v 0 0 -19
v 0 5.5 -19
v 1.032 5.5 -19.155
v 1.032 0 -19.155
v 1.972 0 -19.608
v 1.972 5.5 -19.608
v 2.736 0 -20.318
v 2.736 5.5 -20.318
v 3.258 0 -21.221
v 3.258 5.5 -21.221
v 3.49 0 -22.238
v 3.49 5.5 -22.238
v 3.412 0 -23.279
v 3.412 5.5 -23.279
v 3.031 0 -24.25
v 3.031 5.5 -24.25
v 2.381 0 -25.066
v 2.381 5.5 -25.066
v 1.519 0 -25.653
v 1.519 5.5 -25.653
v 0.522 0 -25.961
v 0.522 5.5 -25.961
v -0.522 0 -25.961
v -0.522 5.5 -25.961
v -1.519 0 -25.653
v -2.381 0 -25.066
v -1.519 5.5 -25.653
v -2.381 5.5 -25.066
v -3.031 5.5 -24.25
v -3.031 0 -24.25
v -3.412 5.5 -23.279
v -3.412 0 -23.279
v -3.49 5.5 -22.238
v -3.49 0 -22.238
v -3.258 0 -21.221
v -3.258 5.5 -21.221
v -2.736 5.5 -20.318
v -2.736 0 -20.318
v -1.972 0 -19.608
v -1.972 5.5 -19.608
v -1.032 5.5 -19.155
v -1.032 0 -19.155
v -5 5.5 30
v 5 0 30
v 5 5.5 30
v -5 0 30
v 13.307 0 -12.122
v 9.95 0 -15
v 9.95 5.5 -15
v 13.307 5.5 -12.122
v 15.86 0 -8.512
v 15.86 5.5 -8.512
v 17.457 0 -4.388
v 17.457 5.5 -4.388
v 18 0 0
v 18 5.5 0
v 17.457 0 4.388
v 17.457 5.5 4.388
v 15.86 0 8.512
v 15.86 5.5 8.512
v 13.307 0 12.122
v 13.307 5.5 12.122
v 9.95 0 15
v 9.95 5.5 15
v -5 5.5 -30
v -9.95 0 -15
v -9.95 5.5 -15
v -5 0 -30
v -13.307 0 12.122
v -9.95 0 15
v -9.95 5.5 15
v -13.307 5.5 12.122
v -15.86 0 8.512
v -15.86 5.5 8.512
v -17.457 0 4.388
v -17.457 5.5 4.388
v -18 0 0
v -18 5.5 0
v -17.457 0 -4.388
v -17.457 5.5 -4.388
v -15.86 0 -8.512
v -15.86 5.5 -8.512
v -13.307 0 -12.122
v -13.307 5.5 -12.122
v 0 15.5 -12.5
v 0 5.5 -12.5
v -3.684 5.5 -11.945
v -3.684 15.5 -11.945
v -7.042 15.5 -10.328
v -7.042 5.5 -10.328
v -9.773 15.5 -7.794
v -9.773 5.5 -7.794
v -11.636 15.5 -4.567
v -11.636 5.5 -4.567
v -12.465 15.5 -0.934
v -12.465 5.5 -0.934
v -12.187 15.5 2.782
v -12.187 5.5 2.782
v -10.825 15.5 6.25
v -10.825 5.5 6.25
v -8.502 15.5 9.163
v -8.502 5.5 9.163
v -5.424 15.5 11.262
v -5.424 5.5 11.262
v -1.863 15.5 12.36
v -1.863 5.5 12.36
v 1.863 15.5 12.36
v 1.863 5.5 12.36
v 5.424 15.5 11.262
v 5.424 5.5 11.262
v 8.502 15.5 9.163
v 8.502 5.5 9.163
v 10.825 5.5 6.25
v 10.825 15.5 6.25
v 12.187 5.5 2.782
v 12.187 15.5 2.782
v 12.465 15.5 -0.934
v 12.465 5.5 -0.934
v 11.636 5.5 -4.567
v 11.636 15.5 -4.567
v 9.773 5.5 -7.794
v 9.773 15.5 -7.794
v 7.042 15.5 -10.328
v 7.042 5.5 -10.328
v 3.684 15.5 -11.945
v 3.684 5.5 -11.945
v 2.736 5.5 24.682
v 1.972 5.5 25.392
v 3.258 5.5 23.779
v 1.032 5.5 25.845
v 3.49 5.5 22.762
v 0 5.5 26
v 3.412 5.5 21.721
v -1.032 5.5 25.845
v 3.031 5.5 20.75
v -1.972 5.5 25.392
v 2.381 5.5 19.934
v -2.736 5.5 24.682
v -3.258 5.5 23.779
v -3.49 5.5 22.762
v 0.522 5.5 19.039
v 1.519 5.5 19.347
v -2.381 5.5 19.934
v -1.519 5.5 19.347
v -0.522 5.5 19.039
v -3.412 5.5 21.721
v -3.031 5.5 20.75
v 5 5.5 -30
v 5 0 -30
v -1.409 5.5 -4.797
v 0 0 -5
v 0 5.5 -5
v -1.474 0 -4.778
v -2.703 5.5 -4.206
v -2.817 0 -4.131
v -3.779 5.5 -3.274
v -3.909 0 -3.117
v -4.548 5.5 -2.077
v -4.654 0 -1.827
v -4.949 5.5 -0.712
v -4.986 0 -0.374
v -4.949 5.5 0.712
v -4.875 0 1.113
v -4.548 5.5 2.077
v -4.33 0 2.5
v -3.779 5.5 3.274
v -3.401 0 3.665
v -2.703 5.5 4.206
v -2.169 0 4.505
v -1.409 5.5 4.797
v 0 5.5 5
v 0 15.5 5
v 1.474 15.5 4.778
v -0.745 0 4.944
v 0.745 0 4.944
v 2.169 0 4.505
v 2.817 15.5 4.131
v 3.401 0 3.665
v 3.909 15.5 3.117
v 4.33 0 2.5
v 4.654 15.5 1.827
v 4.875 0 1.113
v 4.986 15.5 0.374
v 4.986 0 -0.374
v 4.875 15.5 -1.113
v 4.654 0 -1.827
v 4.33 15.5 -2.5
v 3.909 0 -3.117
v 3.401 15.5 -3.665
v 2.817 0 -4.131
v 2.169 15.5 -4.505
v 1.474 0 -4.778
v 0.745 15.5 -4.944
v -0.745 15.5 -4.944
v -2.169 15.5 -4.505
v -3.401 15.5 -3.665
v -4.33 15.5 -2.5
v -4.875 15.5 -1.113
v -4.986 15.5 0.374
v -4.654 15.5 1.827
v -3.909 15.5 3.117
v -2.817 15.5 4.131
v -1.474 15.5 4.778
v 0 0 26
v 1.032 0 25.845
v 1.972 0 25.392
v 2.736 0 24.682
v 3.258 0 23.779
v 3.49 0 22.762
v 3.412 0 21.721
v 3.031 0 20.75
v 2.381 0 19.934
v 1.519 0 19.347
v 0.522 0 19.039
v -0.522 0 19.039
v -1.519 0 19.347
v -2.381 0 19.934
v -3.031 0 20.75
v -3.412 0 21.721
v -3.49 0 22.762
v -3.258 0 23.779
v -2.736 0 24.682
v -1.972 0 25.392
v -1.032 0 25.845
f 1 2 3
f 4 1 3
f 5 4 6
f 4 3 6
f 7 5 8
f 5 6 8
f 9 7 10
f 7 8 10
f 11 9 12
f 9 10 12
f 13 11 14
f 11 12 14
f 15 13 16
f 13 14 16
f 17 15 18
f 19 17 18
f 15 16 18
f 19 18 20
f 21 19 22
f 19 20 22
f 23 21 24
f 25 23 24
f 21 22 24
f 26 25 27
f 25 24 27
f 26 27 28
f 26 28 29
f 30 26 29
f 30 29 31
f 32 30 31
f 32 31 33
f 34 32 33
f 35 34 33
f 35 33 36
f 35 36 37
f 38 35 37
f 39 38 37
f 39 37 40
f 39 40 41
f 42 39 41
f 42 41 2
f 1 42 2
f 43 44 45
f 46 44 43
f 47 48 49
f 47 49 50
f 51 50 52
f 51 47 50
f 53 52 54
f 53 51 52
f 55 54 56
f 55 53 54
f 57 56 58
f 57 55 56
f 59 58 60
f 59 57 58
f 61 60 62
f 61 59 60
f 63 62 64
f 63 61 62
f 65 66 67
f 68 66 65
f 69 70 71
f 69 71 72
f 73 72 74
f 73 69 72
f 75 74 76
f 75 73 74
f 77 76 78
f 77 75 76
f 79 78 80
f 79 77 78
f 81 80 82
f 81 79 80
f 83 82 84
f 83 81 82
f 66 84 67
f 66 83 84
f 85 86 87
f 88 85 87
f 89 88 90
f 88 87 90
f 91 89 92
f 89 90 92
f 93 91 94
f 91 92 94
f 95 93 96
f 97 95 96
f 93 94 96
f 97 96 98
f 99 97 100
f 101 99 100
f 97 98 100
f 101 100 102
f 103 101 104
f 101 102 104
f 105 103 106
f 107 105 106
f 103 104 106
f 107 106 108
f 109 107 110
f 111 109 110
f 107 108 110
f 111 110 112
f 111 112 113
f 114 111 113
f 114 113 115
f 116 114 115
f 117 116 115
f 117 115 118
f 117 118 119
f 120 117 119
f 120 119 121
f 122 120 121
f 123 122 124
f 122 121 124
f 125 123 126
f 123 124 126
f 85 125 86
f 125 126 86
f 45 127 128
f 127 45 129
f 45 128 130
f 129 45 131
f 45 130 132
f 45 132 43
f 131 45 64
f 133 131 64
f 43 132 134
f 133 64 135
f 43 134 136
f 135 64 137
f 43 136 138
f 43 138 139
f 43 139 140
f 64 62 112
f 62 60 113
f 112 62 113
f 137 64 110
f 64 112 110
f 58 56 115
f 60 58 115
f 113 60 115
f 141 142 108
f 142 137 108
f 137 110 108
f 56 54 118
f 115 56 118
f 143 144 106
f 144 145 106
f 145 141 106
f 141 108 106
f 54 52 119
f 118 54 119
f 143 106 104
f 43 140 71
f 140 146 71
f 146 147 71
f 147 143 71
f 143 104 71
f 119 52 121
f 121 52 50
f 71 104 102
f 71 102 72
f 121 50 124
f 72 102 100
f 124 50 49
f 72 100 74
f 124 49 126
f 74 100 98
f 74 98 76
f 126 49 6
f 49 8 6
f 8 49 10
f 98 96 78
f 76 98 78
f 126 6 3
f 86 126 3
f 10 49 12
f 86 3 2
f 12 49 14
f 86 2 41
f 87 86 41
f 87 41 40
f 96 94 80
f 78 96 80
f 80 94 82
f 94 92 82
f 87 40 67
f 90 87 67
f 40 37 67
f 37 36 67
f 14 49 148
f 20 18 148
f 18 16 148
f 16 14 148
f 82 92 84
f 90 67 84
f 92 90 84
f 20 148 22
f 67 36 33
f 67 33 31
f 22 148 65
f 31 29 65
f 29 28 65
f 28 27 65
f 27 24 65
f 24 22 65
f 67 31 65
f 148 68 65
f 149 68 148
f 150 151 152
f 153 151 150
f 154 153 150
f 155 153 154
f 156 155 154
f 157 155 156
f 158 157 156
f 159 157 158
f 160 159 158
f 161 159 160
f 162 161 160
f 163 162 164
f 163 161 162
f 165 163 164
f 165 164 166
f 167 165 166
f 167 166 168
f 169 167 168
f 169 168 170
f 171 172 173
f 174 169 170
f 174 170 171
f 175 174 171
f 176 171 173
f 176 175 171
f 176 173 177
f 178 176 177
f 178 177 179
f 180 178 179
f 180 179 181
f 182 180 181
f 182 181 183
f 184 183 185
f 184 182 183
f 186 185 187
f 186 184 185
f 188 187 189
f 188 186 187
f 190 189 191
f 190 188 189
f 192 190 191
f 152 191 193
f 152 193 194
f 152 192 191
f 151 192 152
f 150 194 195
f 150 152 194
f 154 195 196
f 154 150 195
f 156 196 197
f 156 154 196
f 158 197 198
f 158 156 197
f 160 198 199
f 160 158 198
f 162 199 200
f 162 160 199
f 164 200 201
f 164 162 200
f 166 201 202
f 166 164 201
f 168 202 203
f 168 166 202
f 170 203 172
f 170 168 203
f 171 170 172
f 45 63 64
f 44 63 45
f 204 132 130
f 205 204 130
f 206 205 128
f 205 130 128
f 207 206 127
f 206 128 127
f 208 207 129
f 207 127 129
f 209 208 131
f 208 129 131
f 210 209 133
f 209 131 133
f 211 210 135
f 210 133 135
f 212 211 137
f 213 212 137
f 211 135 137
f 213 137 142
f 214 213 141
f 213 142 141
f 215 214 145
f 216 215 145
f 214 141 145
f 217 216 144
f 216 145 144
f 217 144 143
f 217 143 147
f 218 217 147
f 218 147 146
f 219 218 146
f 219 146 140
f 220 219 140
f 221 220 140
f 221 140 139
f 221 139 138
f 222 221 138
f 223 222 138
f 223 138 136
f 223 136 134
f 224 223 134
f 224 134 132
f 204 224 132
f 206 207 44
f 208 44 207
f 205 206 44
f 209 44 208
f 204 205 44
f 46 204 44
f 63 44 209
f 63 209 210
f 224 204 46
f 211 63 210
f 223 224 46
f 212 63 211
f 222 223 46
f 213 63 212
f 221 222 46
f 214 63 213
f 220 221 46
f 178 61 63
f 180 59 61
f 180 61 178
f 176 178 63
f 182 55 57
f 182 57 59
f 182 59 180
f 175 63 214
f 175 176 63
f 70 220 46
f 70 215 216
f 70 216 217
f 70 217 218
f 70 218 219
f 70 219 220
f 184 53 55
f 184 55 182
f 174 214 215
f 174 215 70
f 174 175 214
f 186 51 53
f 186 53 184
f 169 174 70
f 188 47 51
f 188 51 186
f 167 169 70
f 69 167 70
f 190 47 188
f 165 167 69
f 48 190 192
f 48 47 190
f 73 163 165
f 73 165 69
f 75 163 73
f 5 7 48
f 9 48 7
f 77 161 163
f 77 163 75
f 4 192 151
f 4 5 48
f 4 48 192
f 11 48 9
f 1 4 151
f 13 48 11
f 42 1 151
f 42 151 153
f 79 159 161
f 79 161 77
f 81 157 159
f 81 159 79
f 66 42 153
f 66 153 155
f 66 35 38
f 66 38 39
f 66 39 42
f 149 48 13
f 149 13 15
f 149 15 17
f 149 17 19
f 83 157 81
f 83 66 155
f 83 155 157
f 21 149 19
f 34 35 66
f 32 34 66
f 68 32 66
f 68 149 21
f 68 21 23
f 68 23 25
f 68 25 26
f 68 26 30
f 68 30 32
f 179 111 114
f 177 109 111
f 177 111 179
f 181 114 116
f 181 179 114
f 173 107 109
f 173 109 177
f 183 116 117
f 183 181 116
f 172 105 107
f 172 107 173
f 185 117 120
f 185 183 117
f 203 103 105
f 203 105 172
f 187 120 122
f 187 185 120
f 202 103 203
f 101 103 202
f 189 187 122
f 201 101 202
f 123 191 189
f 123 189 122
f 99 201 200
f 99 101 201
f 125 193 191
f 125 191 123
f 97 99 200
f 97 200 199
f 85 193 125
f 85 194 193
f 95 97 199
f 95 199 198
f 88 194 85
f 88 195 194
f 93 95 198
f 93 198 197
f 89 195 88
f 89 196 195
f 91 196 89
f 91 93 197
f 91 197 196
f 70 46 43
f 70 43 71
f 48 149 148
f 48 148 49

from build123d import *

# Parameters (mm, degrees)
BOSS_EXTRU_1_DEPTH      = 5.5
ESQUISSE2_R             = 12.5
ESQUISSE2_R_2           = 5
BOSS_EXTRU_2_DEPTH      = 10
ENL_V_START             = -10
ESQUISSE3_R             = 5
ENL_V_MAT_EXTRU_1_DEPTH = 10
ESQUISSE4_R             = 3.5
ENL_V_MAT_EXTRU_2_DEPTH = 10
D_GAGEMENT_M61_D        = 7
D_GAGEMENT_M61_DEPTH    = 120
D_GAGEMENT_M61_TIP      = 2.103012167
D_GAGEMENT_M62_D        = 7
D_GAGEMENT_M62_DEPTH    = 120
D_GAGEMENT_M62_TIP      = 2.103012167


with BuildPart() as part:
    # Esquisse1 → Boss.-Extru.1 (new body)
    with BuildSketch(Plane(origin=(0, 0, 0), x_dir=(1, 0, 0), z_dir=(0, 1, 0))):
        with BuildLine():
            Line((-9.949874371, 15), (-5, 30))
            Line((-5, 30), (5, 30))
            Line((5, 30), (9.949874371, 15))
            ThreePointArc((9.949874371, 15), (18, 0), (9.949874371, -15))
            Line((9.949874371, -15), (5, -30))
            Line((5, -30), (-5, -30))
            Line((-5, -30), (-9.949874371, -15))
            ThreePointArc((-9.949874371, -15), (-18, 0), (-9.949874371, 15))
        make_face()
    extrude(amount=BOSS_EXTRU_1_DEPTH)

    # Esquisse2 → Boss.-Extru.2 (add)
    with BuildSketch(Plane(origin=(0, 5.5, 0), x_dir=(1, 0, 0), z_dir=(0, 1, 0))):
        with Locations(Location((0, 0, 0), (0, 0, 90))):
            Circle(ESQUISSE2_R)
        with Locations(Location((0, 0, 0), (0, 0, 270))):
            Circle(ESQUISSE2_R_2, mode=Mode.SUBTRACT)
    extrude(amount=BOSS_EXTRU_2_DEPTH)

    # Esquisse3 → Enlèv. mat.-Extru.1 (cut)
    with BuildSketch(Plane(origin=(0, 5.5, 0), x_dir=(1, 0, 0), z_dir=(0, 1, 0)).offset(ENL_V_START)):
        with Locations(Location((0, 0, 0), (0, 0, 90))):
            Circle(ESQUISSE3_R)
    extrude(amount=ENL_V_MAT_EXTRU_1_DEPTH, mode=Mode.SUBTRACT)

    # Esquisse4 → Enlèv. mat.-Extru.2 (cut)
    with BuildSketch(Plane(origin=(0, 5.5, 0), x_dir=(1, 0, 0), z_dir=(0, 1, 0))):
        with Locations(Location((0, 22.5, 0), (0, 0, 270))):
            Circle(ESQUISSE4_R)
        with Locations(Location((0, -22.5, 0), (0, 0, 270))):
            Circle(ESQUISSE4_R)
    extrude(amount=-ENL_V_MAT_EXTRU_2_DEPTH, mode=Mode.SUBTRACT)

    # Dégagement M61
    with Locations(Plane(origin=(0, 0, 0), x_dir=(0, 0, -1), z_dir=(0, 1, 0))):
        with Locations((22.5, 0), (-22.5, 0)):
            Hole(D_GAGEMENT_M61_D / 2, depth=D_GAGEMENT_M61_DEPTH)
            with Locations((0, 0, -(D_GAGEMENT_M61_DEPTH + D_GAGEMENT_M61_TIP / 2))):  # 118° drill point
                Cone(0, D_GAGEMENT_M61_D / 2, D_GAGEMENT_M61_TIP, mode=Mode.SUBTRACT)

    # Dégagement M62
    with Locations(Plane(origin=(0, -60, 0), x_dir=(0, 0, 1), z_dir=(0, -1, 0))):
        with Locations((22.5, 0), (-22.5, 0)):
            Hole(D_GAGEMENT_M62_D / 2, depth=D_GAGEMENT_M62_DEPTH)
            with Locations((0, 0, -(D_GAGEMENT_M62_DEPTH + D_GAGEMENT_M62_TIP / 2))):  # 118° drill point
                Cone(0, D_GAGEMENT_M62_D / 2, D_GAGEMENT_M62_TIP, mode=Mode.SUBTRACT)


solid = part.part
